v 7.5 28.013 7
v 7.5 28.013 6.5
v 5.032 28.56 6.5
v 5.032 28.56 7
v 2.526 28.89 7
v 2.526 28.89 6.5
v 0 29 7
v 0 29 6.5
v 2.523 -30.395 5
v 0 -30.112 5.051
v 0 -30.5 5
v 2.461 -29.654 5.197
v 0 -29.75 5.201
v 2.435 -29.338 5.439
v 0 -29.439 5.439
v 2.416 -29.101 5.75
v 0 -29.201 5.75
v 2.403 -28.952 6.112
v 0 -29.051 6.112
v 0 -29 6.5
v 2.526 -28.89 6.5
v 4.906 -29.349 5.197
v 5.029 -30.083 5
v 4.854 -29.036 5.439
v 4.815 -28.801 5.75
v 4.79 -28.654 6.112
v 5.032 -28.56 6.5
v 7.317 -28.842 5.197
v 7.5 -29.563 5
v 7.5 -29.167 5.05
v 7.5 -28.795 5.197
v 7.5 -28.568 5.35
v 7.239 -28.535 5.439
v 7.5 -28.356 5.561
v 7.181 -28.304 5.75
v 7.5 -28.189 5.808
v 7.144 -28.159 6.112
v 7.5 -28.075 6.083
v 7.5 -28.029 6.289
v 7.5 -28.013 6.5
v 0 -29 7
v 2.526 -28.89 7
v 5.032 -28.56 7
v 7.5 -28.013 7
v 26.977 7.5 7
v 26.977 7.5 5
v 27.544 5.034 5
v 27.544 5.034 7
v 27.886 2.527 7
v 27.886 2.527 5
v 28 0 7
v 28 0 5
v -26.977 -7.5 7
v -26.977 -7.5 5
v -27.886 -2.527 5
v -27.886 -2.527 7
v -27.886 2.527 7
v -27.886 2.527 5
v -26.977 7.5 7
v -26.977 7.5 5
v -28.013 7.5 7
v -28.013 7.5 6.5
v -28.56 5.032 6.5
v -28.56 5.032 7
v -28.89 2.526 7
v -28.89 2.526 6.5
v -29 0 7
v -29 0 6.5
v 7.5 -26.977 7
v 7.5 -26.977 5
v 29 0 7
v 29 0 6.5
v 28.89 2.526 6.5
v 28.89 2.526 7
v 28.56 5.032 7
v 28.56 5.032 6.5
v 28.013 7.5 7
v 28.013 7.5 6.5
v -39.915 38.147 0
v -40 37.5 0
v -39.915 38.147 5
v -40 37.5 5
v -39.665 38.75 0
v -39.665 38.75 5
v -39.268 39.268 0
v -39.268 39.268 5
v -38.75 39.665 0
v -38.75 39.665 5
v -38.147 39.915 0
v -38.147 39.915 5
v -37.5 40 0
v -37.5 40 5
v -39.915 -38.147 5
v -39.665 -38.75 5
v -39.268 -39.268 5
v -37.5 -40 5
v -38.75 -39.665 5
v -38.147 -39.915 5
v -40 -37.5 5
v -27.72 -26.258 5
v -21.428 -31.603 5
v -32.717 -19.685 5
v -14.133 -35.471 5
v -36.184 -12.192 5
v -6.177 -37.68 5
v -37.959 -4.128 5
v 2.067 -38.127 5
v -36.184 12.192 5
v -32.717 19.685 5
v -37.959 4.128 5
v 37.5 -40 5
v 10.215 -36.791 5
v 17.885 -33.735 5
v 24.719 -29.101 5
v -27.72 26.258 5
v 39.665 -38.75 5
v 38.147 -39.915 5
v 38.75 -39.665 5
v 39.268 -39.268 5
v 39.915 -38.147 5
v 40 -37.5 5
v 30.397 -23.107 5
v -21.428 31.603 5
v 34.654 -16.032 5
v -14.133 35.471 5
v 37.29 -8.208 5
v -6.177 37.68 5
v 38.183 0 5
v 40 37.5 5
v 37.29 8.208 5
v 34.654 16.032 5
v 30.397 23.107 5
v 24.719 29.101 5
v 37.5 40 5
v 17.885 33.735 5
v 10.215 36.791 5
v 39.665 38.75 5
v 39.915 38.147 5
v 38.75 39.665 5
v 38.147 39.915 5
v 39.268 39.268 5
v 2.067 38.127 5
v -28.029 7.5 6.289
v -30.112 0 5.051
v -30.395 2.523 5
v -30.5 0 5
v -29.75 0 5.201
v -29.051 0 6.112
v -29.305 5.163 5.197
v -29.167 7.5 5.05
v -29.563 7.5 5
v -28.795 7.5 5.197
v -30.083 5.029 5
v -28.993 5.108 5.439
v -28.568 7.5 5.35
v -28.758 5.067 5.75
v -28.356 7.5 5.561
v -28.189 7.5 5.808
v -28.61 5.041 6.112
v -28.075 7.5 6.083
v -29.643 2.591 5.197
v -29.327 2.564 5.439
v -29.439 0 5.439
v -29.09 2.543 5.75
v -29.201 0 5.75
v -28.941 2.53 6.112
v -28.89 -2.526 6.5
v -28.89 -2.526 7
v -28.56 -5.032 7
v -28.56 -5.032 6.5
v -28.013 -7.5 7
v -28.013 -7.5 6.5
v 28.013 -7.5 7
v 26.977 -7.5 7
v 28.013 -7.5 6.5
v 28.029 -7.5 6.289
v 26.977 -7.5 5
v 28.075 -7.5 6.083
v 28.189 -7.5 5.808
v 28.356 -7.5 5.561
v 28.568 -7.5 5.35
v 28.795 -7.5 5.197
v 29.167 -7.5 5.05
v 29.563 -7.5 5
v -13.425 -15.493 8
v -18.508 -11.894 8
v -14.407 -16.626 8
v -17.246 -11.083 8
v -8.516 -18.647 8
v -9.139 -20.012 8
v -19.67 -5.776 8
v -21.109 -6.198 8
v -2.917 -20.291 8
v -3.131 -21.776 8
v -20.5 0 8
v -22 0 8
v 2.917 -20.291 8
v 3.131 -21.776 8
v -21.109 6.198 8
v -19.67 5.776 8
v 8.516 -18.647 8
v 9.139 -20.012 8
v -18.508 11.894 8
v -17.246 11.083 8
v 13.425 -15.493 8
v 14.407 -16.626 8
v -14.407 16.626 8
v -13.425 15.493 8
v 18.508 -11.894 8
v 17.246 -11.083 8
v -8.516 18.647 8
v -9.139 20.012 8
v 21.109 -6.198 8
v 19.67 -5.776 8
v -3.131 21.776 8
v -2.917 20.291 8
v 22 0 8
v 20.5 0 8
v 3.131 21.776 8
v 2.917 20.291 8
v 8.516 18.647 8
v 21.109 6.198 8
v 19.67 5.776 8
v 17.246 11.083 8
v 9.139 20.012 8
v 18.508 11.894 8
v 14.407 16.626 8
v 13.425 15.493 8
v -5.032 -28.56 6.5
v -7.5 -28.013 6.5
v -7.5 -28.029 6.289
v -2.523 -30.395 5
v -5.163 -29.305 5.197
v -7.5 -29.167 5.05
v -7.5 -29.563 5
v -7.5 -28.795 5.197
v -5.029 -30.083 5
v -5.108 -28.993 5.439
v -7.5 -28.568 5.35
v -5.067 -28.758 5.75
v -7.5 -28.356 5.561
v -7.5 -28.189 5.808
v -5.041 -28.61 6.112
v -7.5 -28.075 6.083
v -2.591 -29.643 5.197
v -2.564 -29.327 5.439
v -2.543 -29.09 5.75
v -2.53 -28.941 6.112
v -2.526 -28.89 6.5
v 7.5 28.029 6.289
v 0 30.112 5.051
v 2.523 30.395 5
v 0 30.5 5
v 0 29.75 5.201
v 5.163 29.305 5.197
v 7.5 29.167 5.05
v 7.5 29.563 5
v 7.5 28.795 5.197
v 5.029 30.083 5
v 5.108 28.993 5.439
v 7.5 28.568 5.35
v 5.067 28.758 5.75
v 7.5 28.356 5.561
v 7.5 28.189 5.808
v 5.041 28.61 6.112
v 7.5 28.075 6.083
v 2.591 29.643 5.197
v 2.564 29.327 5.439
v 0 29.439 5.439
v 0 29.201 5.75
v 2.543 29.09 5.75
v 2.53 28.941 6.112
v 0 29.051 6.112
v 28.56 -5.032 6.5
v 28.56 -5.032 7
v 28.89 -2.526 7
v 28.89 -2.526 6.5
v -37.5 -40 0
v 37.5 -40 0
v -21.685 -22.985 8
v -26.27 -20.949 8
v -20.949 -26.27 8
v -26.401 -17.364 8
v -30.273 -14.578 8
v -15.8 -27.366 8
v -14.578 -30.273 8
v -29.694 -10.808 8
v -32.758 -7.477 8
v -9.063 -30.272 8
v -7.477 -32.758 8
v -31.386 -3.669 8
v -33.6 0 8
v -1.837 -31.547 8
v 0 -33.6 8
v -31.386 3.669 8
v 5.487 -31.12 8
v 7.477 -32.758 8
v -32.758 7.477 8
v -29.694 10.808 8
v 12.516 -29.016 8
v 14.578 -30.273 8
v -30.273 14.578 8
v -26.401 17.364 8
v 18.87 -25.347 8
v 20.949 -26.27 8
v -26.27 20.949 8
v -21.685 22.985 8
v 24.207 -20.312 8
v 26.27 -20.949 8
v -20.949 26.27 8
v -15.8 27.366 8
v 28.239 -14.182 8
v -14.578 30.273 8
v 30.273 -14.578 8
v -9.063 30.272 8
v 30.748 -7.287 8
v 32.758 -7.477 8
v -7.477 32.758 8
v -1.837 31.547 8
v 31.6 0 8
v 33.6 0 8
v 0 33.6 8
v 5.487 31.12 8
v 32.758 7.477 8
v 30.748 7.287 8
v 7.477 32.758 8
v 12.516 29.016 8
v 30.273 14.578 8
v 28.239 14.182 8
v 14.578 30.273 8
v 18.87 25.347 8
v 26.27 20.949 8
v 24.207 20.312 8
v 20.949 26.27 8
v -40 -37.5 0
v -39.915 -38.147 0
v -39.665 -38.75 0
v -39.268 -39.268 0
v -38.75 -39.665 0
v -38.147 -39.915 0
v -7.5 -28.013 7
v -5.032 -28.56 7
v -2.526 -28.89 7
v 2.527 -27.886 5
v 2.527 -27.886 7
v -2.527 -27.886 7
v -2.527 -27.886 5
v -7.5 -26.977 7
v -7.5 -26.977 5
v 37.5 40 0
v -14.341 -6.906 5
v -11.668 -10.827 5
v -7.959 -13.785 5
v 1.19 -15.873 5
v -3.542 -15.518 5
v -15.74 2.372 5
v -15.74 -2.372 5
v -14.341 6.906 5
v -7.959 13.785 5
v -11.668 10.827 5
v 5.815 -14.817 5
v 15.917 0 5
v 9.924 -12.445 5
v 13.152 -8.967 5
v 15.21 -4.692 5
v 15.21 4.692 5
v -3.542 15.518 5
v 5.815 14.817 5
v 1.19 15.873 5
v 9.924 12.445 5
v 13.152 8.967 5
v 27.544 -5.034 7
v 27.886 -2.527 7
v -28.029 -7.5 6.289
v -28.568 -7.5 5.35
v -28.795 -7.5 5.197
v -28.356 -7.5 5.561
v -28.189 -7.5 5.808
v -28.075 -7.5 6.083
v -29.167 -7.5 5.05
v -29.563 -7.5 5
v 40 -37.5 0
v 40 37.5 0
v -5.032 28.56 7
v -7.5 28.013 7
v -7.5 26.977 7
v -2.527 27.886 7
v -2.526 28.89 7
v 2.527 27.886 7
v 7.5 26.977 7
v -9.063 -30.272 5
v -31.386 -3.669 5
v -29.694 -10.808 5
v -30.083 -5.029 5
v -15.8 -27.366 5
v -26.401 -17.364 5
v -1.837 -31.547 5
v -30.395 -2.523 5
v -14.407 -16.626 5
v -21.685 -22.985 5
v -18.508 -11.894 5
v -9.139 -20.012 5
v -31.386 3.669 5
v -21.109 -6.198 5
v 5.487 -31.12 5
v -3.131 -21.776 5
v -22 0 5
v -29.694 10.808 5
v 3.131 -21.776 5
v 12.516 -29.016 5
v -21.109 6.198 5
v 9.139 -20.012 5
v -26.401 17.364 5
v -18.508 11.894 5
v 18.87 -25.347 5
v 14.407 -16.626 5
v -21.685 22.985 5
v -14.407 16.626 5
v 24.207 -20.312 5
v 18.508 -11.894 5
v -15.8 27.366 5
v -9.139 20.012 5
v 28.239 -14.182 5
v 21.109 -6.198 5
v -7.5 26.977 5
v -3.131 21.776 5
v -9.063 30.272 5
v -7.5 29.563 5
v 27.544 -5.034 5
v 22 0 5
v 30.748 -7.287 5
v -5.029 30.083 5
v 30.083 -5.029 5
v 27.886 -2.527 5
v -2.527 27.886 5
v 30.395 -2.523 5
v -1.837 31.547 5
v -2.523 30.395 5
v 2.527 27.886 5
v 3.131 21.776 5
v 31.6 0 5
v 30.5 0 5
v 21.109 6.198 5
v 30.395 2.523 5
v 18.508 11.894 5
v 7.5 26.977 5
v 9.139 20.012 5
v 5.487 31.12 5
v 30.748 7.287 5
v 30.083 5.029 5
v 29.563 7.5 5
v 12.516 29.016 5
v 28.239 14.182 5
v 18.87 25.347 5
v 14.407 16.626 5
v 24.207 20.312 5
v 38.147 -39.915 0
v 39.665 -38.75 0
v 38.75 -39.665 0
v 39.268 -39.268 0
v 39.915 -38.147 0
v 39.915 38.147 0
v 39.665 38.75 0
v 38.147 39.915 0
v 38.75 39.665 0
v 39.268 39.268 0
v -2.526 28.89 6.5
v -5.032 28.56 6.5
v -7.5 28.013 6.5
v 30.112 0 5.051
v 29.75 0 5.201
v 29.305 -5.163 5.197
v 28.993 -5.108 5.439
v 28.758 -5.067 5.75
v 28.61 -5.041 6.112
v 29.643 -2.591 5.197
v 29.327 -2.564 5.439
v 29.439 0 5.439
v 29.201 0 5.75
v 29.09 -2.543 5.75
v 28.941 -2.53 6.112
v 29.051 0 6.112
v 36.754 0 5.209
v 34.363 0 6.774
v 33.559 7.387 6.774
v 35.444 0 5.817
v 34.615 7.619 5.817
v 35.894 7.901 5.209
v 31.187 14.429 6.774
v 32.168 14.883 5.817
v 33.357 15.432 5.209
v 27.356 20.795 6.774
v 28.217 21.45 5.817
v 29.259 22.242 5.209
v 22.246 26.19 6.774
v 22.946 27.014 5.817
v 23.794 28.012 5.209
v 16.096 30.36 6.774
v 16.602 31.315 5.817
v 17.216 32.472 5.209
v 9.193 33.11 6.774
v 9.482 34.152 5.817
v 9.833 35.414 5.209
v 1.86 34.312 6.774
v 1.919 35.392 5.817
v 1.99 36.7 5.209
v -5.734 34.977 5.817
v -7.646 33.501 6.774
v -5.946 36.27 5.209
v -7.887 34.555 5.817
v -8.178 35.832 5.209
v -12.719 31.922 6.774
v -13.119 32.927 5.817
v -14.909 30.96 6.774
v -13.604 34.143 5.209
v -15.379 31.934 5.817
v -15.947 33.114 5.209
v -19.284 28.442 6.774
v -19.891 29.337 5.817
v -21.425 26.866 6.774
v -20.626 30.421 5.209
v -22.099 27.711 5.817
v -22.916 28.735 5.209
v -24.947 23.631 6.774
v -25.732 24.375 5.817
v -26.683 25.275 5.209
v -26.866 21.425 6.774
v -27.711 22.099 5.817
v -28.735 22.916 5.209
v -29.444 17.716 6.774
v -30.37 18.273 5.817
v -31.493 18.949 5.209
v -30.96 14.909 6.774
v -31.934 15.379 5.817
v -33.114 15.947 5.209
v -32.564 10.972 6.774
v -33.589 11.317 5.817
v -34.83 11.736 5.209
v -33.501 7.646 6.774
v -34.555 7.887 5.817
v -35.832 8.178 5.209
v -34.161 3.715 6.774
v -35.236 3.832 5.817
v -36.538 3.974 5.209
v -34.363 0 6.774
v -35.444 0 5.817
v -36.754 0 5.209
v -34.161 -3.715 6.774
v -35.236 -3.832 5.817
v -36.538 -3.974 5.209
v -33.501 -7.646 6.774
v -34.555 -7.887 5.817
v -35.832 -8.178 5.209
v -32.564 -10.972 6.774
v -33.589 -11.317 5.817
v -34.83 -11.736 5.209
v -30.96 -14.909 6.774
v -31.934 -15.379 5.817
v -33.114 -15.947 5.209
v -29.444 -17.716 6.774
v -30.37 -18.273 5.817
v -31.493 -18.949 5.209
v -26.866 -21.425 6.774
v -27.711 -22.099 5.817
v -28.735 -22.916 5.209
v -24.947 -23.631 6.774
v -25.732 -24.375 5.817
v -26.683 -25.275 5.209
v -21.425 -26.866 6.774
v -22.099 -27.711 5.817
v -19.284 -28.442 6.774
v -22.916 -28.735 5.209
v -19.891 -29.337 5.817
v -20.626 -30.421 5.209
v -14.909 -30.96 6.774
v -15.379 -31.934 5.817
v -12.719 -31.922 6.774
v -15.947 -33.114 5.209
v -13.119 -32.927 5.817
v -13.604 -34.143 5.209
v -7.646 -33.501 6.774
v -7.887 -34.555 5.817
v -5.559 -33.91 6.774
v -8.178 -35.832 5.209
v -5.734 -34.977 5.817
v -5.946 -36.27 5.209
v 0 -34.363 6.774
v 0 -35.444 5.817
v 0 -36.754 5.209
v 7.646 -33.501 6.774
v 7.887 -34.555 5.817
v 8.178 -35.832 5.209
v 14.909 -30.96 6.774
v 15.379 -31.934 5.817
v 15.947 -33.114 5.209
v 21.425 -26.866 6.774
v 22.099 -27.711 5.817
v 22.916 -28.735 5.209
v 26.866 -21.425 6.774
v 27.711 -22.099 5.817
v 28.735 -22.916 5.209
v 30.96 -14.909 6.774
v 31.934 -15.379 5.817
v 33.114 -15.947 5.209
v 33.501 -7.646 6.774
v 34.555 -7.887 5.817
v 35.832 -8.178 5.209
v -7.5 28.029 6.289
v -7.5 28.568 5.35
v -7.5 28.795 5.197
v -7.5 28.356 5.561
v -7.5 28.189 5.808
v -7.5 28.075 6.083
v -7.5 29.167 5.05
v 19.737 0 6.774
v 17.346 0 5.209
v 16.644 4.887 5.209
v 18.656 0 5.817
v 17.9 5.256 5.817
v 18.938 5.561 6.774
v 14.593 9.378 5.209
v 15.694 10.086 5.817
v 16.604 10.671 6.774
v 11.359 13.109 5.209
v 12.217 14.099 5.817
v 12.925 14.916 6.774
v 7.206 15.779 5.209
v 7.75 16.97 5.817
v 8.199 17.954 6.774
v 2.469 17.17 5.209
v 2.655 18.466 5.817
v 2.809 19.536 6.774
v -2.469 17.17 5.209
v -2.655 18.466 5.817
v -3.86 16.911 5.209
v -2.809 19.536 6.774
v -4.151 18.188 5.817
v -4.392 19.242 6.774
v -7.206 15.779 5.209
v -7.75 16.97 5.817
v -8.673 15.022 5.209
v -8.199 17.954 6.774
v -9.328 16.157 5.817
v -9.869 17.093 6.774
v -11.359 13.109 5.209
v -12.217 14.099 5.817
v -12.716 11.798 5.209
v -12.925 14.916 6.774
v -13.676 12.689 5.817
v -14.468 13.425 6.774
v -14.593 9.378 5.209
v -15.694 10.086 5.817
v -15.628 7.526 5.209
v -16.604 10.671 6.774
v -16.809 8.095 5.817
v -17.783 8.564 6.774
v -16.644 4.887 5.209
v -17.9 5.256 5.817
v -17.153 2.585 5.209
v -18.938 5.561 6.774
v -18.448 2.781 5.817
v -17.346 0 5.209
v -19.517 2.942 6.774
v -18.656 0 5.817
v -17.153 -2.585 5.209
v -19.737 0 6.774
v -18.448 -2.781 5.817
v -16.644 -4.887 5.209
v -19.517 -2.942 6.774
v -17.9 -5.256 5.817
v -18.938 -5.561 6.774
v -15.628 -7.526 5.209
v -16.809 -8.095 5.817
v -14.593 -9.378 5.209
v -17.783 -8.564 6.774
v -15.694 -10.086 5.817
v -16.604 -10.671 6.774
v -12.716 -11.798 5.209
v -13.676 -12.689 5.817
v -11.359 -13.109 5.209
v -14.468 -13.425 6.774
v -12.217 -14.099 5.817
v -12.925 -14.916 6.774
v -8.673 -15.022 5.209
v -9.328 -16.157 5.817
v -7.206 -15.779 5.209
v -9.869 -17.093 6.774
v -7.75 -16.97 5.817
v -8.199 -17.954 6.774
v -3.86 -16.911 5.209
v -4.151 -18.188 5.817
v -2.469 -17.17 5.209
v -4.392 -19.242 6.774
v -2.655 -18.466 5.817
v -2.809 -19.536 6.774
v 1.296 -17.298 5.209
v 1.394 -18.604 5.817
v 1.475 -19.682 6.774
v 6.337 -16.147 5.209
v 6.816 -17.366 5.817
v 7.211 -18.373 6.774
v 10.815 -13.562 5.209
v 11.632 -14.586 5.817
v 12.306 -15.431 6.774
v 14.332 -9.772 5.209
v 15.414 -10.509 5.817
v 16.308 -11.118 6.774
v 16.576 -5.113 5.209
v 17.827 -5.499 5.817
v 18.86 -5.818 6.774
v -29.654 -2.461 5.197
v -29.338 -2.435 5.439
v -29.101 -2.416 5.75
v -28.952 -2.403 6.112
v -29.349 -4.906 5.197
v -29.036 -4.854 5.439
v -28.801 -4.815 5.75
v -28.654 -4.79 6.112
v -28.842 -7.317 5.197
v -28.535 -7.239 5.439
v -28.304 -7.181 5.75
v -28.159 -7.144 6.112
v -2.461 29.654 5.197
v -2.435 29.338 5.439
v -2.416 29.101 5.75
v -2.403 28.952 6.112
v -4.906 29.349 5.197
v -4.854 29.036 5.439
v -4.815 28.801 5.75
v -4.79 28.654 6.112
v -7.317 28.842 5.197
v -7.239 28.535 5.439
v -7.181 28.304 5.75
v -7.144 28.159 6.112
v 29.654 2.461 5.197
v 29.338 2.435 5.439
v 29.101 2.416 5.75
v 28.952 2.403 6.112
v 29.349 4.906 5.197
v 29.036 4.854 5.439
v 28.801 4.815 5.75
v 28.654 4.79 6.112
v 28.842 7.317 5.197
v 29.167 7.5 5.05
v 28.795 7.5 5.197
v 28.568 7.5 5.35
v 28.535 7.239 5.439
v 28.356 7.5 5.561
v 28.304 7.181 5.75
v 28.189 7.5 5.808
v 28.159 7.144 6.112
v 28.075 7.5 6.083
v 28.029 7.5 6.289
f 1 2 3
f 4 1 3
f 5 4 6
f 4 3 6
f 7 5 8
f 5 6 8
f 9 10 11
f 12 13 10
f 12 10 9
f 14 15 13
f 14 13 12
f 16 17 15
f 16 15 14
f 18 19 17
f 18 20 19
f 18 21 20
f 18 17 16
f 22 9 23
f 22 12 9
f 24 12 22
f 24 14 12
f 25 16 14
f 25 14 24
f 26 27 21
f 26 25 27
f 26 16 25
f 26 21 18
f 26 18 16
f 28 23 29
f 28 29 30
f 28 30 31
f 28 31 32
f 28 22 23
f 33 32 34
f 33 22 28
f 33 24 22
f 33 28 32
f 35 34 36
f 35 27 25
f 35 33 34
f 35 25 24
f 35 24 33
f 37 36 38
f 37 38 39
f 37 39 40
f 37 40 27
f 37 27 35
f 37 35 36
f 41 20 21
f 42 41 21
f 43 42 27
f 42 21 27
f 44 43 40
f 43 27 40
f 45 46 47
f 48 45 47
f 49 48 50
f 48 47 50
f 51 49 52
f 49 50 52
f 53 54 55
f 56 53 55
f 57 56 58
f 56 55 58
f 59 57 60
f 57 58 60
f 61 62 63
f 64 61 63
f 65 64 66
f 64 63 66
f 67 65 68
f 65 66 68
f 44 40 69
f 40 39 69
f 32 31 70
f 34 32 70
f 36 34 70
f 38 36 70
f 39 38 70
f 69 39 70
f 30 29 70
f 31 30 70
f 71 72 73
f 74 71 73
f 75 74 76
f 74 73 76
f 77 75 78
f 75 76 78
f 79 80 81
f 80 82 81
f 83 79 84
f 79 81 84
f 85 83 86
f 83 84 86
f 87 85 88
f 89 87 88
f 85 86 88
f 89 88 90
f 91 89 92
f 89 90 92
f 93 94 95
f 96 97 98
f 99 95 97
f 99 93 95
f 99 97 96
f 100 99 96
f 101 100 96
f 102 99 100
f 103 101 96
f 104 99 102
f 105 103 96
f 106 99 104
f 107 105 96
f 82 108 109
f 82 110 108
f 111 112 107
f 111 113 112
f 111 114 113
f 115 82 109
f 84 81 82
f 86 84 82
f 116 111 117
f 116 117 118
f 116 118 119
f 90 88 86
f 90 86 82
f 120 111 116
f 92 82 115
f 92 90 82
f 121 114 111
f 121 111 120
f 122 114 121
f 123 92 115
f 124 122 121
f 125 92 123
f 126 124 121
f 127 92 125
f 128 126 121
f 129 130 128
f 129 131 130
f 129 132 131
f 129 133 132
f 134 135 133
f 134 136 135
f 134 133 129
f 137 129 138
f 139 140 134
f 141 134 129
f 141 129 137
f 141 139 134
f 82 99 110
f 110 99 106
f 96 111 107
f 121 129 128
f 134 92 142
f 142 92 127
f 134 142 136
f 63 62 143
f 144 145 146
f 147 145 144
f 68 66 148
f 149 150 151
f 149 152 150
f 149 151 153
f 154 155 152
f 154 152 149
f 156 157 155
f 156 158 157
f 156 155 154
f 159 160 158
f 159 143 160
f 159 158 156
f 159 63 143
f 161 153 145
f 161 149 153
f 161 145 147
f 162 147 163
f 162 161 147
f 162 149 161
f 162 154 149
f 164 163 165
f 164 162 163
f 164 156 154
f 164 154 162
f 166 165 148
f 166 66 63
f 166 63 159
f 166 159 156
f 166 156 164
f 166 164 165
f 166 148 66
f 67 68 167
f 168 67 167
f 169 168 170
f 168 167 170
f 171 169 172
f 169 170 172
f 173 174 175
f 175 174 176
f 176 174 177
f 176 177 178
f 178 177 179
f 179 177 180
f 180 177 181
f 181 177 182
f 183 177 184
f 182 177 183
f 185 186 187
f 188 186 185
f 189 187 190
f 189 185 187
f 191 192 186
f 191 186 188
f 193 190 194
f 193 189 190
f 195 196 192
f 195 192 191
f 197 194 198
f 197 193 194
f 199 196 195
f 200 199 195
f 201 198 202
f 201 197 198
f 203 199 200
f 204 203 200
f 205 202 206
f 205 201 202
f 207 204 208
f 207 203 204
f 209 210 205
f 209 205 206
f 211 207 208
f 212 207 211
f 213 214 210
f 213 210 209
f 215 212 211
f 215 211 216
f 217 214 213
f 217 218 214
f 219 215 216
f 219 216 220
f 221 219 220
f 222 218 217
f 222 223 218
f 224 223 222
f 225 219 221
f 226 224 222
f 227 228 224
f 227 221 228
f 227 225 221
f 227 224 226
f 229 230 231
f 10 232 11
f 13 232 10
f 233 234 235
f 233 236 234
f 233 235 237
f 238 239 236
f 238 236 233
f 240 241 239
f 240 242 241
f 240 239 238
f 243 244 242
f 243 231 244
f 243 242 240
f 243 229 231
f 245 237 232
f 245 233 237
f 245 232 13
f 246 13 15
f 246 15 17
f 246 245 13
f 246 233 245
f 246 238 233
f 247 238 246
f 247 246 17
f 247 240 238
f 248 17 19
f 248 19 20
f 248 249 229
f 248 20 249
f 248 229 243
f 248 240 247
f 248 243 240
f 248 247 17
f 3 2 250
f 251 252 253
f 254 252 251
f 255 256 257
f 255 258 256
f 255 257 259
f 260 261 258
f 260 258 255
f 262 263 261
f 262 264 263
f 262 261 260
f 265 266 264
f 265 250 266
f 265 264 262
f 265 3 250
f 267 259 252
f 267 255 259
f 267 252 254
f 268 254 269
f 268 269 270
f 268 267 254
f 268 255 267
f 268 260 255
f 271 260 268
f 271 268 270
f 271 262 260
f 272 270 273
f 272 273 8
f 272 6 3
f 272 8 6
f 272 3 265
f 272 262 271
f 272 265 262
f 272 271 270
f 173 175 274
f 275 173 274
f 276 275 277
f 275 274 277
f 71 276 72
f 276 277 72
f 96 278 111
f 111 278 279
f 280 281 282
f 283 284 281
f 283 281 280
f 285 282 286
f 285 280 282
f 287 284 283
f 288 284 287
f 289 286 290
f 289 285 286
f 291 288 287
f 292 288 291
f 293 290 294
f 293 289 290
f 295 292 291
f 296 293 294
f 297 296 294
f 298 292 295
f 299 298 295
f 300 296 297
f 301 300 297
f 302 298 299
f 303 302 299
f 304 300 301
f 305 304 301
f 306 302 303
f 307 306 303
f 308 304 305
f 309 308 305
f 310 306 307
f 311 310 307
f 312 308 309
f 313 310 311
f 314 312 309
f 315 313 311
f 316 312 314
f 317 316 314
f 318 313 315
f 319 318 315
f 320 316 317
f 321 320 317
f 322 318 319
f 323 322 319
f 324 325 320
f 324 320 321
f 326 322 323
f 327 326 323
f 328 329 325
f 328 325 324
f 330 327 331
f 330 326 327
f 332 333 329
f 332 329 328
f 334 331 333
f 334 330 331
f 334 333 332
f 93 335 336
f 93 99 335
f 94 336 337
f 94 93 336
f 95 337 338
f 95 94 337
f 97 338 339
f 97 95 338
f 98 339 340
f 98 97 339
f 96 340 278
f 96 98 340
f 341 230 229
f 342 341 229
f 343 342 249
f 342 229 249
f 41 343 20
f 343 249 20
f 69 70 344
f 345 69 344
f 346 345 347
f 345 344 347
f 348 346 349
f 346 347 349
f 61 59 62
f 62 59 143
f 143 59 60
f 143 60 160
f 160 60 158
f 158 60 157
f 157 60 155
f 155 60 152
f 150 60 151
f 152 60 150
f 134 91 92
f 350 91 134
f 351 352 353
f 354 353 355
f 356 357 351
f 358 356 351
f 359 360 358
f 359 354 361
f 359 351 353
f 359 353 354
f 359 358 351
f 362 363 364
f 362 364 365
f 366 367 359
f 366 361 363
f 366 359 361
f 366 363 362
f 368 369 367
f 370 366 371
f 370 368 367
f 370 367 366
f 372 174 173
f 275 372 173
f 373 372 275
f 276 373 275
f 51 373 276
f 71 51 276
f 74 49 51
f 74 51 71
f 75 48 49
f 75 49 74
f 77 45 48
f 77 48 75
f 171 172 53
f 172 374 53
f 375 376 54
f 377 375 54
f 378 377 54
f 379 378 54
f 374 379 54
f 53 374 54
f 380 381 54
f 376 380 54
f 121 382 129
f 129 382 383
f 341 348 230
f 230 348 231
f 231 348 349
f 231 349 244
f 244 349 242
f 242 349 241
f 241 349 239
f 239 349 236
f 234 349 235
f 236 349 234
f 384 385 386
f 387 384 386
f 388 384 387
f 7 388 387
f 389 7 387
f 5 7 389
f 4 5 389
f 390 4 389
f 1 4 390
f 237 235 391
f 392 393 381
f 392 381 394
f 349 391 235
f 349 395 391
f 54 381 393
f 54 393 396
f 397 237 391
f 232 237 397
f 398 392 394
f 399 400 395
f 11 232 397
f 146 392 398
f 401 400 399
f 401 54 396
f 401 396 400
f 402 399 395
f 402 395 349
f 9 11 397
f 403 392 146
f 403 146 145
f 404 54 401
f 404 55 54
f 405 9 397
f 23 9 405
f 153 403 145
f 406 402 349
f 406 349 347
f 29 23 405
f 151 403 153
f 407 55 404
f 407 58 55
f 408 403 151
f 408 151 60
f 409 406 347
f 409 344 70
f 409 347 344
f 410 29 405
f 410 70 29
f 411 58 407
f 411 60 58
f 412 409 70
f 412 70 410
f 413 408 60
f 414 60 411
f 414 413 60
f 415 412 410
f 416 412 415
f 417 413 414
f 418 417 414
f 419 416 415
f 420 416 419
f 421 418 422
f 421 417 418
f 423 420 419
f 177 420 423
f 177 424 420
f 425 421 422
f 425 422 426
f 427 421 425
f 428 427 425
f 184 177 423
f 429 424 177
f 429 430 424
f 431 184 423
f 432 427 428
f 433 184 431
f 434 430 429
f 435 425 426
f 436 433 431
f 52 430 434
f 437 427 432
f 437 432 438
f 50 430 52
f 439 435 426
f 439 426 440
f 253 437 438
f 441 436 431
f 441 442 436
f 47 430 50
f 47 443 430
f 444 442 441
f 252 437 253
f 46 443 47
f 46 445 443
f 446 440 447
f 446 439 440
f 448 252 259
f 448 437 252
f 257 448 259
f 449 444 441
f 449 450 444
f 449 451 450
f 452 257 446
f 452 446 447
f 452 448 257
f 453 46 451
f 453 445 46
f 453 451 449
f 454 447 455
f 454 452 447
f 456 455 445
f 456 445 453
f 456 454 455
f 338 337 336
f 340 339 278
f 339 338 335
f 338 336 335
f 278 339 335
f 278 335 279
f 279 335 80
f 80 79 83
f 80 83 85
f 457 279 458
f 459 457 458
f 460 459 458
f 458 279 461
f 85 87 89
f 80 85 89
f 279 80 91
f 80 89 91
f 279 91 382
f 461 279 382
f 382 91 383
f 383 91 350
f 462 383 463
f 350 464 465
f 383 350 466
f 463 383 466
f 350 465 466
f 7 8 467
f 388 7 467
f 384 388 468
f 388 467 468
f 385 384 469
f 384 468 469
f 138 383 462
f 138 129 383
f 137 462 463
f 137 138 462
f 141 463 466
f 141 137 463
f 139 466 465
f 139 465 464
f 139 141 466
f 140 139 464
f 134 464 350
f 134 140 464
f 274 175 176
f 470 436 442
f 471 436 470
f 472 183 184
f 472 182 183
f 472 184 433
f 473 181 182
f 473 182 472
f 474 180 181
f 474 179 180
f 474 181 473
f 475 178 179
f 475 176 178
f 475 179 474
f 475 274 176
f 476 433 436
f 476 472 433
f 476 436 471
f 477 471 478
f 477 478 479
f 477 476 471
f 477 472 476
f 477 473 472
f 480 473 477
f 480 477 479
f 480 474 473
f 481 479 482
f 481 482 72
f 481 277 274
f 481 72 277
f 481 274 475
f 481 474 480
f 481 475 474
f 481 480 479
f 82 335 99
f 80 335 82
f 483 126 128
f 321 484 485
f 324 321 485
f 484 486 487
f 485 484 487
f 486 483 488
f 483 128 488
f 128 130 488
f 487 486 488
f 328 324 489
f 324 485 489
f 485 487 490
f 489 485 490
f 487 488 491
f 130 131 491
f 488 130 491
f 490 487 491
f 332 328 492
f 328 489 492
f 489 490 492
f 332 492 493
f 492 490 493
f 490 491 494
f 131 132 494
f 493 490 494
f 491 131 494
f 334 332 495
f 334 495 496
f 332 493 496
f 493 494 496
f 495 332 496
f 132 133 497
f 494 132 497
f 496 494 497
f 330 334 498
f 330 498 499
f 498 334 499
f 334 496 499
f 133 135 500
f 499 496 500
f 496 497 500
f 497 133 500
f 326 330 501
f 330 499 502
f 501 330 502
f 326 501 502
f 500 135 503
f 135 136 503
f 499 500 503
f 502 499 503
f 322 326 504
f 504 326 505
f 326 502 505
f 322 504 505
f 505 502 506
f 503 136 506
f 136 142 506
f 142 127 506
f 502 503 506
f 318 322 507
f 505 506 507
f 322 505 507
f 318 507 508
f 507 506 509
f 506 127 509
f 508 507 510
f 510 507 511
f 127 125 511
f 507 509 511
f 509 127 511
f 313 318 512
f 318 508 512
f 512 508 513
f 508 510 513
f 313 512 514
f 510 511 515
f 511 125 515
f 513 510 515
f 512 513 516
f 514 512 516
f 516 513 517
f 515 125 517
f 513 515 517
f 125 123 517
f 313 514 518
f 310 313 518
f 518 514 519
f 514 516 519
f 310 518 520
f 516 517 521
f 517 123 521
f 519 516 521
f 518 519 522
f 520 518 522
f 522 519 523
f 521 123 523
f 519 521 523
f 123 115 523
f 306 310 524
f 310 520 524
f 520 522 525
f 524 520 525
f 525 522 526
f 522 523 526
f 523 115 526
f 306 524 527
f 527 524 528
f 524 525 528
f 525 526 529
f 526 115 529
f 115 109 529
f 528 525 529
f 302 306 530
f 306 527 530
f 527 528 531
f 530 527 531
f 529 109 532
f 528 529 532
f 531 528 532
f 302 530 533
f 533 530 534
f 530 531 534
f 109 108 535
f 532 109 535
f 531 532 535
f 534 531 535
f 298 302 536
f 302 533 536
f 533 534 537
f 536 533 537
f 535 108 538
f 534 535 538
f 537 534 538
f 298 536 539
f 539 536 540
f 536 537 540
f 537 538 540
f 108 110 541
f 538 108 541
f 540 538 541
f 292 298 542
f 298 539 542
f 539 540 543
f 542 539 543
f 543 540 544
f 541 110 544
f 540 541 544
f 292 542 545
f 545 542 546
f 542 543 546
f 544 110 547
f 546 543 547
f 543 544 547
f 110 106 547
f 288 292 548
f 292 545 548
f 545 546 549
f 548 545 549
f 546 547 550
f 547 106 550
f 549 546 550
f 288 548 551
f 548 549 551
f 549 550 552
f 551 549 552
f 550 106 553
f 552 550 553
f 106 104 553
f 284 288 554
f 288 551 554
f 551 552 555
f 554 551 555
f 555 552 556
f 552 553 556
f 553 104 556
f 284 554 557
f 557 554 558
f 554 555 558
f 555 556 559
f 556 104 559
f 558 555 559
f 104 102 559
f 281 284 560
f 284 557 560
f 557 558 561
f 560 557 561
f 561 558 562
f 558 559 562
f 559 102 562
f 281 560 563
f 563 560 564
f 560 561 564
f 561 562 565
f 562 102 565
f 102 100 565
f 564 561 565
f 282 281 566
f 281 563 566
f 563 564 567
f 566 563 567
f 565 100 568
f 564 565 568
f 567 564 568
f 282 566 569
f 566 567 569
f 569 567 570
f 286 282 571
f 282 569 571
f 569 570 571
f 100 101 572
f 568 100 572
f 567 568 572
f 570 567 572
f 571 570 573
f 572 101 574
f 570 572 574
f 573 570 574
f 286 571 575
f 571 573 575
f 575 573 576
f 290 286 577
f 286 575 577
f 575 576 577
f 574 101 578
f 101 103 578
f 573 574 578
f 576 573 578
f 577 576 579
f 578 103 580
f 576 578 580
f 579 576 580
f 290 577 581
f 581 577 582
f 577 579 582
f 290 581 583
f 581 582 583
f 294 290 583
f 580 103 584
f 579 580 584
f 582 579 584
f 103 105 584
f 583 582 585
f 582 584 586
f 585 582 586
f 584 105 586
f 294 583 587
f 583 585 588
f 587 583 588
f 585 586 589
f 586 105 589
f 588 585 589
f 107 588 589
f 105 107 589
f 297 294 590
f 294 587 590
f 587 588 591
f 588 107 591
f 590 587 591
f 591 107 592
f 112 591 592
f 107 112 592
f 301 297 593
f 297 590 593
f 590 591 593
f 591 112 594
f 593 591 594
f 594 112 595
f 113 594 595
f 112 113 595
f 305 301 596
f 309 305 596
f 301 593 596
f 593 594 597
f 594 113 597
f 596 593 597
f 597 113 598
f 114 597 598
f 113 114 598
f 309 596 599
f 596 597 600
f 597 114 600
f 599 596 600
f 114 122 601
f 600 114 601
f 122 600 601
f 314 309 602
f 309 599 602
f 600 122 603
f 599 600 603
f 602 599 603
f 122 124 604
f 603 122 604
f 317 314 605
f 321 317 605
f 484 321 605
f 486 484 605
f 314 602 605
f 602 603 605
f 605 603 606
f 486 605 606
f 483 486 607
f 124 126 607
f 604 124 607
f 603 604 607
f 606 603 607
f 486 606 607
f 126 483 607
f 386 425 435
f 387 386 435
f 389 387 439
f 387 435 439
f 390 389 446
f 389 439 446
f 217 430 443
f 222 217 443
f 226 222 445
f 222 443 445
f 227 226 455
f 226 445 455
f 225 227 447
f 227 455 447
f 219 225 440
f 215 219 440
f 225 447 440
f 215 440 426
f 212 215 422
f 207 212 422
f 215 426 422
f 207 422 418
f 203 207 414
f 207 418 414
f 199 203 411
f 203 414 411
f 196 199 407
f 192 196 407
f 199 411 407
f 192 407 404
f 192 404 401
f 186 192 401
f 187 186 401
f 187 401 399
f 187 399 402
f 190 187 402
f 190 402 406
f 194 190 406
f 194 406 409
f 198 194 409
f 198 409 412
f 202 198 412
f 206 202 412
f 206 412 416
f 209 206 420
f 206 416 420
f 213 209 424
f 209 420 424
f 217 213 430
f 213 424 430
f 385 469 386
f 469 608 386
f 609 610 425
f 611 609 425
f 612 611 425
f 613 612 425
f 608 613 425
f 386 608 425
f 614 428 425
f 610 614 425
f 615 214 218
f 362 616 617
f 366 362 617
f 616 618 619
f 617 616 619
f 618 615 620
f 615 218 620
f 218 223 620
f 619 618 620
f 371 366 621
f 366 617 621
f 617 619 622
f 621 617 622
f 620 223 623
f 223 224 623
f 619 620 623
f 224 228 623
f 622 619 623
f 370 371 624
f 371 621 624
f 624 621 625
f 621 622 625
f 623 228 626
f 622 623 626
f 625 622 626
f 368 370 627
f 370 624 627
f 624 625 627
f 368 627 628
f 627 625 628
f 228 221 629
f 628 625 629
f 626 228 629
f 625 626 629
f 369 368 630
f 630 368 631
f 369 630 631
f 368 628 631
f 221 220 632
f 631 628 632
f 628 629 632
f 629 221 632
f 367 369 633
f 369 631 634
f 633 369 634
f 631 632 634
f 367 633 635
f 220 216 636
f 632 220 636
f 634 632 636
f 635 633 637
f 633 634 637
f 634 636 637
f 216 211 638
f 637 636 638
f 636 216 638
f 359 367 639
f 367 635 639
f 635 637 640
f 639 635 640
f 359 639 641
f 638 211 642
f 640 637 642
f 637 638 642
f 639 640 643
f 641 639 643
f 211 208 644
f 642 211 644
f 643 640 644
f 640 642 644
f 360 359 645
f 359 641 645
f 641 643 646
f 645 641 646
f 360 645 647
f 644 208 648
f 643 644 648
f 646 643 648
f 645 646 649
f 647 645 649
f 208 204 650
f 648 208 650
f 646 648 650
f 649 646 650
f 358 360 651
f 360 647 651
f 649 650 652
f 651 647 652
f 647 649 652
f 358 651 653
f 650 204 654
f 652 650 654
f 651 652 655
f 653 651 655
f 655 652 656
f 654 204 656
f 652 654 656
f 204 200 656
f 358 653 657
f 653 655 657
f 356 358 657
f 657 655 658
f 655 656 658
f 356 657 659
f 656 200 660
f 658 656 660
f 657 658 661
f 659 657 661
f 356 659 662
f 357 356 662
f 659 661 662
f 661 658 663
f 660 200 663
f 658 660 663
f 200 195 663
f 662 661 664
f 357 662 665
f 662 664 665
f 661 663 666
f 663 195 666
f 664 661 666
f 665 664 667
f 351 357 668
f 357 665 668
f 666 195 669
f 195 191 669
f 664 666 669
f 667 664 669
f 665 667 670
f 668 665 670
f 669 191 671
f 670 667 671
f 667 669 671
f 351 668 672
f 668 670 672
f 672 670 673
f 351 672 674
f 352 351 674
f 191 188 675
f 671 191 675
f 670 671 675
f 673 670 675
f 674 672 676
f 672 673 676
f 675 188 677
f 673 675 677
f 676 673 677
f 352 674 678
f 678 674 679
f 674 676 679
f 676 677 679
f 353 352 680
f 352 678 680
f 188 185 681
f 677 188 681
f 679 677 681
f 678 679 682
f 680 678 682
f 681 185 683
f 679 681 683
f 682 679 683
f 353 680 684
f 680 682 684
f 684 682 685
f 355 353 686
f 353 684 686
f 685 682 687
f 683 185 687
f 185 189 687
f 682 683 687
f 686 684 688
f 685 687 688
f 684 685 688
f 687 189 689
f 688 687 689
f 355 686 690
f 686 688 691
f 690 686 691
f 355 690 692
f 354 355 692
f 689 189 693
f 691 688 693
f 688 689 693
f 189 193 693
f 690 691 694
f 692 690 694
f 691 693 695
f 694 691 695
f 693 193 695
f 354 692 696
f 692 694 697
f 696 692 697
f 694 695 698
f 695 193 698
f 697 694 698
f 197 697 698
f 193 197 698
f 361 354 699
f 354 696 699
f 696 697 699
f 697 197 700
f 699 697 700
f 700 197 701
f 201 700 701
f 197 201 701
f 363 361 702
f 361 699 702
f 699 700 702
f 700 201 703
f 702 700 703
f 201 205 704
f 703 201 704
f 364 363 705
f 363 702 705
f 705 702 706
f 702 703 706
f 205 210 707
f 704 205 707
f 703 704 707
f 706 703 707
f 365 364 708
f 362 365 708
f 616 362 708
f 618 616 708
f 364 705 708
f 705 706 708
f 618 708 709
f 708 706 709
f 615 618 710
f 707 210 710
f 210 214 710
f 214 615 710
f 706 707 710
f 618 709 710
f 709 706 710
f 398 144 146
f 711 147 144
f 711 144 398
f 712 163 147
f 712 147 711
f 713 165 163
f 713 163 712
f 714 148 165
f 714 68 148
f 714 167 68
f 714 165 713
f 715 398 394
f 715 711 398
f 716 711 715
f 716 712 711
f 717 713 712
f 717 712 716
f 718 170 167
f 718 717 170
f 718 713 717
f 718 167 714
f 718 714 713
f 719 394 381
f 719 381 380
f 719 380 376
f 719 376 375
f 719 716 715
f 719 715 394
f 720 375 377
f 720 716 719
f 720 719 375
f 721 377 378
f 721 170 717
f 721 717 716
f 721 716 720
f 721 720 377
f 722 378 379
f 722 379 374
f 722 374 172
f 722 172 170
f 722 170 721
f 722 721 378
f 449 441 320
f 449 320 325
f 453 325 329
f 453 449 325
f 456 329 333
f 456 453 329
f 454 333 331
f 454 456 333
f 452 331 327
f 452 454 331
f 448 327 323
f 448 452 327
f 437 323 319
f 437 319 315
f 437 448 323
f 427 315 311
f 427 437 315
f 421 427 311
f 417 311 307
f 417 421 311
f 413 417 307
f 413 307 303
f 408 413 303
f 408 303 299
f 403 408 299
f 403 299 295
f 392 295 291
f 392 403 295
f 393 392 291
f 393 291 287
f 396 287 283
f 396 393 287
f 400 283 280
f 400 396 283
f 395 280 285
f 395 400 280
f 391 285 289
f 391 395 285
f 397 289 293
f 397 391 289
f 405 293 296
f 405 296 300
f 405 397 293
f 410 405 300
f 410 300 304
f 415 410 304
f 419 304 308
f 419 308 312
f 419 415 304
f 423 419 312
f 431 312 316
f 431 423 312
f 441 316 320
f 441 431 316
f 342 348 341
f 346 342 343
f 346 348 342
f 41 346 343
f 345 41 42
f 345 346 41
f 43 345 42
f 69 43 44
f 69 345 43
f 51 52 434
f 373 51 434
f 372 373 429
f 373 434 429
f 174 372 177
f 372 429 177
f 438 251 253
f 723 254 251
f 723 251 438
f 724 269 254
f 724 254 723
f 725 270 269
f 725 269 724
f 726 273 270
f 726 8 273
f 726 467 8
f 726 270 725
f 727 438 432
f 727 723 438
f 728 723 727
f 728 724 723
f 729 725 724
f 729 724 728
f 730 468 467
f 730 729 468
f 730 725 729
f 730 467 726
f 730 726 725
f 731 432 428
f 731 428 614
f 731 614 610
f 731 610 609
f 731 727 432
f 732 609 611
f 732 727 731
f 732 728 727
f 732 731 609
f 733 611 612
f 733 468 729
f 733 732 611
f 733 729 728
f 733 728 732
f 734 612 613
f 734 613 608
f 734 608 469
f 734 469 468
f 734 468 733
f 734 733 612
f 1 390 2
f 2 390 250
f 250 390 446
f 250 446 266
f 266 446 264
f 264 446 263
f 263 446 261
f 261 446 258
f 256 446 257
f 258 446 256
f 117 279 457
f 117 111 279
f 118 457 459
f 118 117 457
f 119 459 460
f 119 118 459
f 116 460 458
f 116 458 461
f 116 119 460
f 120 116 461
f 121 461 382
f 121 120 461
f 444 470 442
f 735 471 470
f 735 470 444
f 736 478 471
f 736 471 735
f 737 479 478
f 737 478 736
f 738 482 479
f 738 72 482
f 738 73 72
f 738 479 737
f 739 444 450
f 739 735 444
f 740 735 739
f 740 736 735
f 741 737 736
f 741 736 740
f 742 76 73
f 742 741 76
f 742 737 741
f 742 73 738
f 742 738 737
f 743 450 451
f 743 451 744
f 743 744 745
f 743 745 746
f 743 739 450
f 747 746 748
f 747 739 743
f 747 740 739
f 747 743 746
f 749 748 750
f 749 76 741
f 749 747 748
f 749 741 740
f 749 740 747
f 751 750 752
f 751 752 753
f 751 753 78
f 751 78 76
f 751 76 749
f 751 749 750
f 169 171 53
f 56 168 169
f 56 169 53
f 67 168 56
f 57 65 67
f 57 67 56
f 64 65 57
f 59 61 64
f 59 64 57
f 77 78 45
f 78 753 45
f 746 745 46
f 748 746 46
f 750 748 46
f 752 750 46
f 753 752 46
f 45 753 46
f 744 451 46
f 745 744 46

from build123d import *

# Parameters (mm, degrees)
SKETCH1_W           = 80
SKETCH1_H           = 80
BOSS_EXTRUDE1_DEPTH = 5
FILLET1_R           = 2.5
BOSS_EXTRUDE5_DEPTH = 2
SKETCH12_R          = 33.6
SKETCH12_R_2        = 31.6
BOSS_EXTRUDE8_DEPTH = 3
SKETCH13_R          = 22
SKETCH13_R_2        = 20.5
BOSS_EXTRUDE9_DEPTH = 3
FILLET2_R           = 1.5
FILLET3_R           = 5


with BuildPart() as part:
    # Sketch1 → Boss-Extrude1 (new body)
    with BuildSketch(Plane.XY):
        Rectangle(SKETCH1_W, SKETCH1_H)
    extrude(amount=BOSS_EXTRUDE1_DEPTH)

    # Fillet1
    fillet1_edges = [part.edges().sort_by_distance(p)[0] for p in [
        (40, -40, 2.5),
        (-40, -40, 2.5),
        (-40, 40, 2.5),
        (40, 40, 2.5),
    ]]
    fillet(fillet1_edges, radius=FILLET1_R)

    # Sketch5 → Boss-Extrude5 (add)
    with BuildSketch(Plane.XY.offset(5)):
        with BuildLine():
            ThreePointArc((7.5, 28.013389656), (3.782307496, 28.752289474), (0, 29))
            ThreePointArc((0, 29), (-3.782307496, 28.752289474), (-7.5, 28.013389656))
            Line((-7.5, 28.013389656), (-7.5, 26.97684192))
            ThreePointArc((-7.5, 26.97684192), (0, 28), (7.5, 26.97684192))
            Line((7.5, 26.97684192), (7.5, 28.013389656))
        make_face()
        with BuildLine():
            ThreePointArc((7.5, -26.97684192), (0, -28), (-7.5, -26.97684192))
            Line((-7.5, -26.97684192), (-7.5, -28.013389656))
            ThreePointArc((-7.5, -28.013389656), (-3.782307496, -28.752289474), (0, -29))
            ThreePointArc((0, -29), (3.782307496, -28.752289474), (7.5, -28.013389656))
            Line((7.5, -28.013389656), (7.5, -26.97684192))
        make_face()
        with BuildLine():
            Line((-26.97684192, 7.5), (-28.013389656, 7.5))
            ThreePointArc((-28.013389656, 7.5), (-28.752289466, 3.782307556), (-29, 1.22e-07))
            ThreePointArc((-29, 1.22e-07), (-28.752289482, -3.782307436), (-28.013389656, -7.5))
            Line((-28.013389656, -7.5), (-26.97684192, -7.5))
            ThreePointArc((-26.97684192, -7.5), (-28, 0), (-26.97684192, 7.5))
        make_face()
        with BuildLine():
            ThreePointArc((29, 0), (28.752289474, 3.782307496), (28.013389656, 7.5))
            Line((28.013389656, 7.5), (26.97684192, 7.5))
            ThreePointArc((26.97684192, 7.5), (27.743031321, 3.78473422), (28, 0))
            ThreePointArc((28, 0), (27.743031321, -3.78473422), (26.97684192, -7.5))
            Line((26.97684192, -7.5), (28.013389656, -7.5))
            ThreePointArc((28.013389656, -7.5), (28.752289474, -3.782307496), (29, 0))
        make_face()
    extrude(amount=BOSS_EXTRUDE5_DEPTH)

    # Sketch12 → Boss-Extrude8 (add)
    with BuildSketch(Plane.XY.offset(5)):
        Circle(SKETCH12_R)
        Circle(SKETCH12_R_2, mode=Mode.SUBTRACT)
    extrude(amount=BOSS_EXTRUDE8_DEPTH)

    # Sketch13 → Boss-Extrude9 (add)
    with BuildSketch(Plane.XY.offset(5)):
        Circle(SKETCH13_R)
        Circle(SKETCH13_R_2, mode=Mode.SUBTRACT)
    extrude(amount=BOSS_EXTRUDE9_DEPTH)

    # Fillet2
    fillet2_edges = [part.edges().sort_by_distance(p)[0] for p in [
        (0, 29, 5),
        (29, 0, 5),
        (-29, 0, 5),
        (0, -29, 5),
    ]]
    fillet(fillet2_edges, radius=FILLET2_R)

    # Fillet3
    # the kernel refuses this fillet: 5 mm, written as the material it adds along each edge
    with BuildSketch(Plane(origin=(0, 0, 5), x_dir=(1, 0, 0), z_dir=(0, -1, 0))) as fillet3_piece_1:
        with BuildLine():
            CenterArc((38.182575695, 5), FILLET3_R, 203.578178478, 66.421821522)
            Line((38.182575695, 0), (38.182575695, -0.1))
            Line((38.182575695, -0.1), (33.6, -0.1))
            Line((33.6, -0.1), (33.5, 0))
            ThreePointArc((33.5, 0), (33.5, 1.5), (33.508348486, 2.96))
            Line((33.508348486, 2.96), (33.6, 3))
        make_face()
    revolve(axis=Axis((0, 0, 5), (0, 0, 1)))
    with BuildSketch(Plane(origin=(0, 0, 5), x_dir=(1, 0, 0), z_dir=(0, -1, 0))) as fillet3_piece_2:
        with BuildLine():
            CenterArc((15.917424305, 5), FILLET3_R, 270, 66.421821522)
            Line((15.917424305, 0), (15.917424305, -0.1))
            Line((15.917424305, -0.1), (20.5, -0.1))
            Line((20.5, -0.1), (20.6, 0))
            ThreePointArc((20.6, 0), (20.6, 1.5), (20.591651514, 2.96))
            Line((20.591651514, 2.96), (20.5, 3))
        make_face()
    revolve(axis=Axis((0, 0, 5), (0, 0, 1)))


solid = part.part
